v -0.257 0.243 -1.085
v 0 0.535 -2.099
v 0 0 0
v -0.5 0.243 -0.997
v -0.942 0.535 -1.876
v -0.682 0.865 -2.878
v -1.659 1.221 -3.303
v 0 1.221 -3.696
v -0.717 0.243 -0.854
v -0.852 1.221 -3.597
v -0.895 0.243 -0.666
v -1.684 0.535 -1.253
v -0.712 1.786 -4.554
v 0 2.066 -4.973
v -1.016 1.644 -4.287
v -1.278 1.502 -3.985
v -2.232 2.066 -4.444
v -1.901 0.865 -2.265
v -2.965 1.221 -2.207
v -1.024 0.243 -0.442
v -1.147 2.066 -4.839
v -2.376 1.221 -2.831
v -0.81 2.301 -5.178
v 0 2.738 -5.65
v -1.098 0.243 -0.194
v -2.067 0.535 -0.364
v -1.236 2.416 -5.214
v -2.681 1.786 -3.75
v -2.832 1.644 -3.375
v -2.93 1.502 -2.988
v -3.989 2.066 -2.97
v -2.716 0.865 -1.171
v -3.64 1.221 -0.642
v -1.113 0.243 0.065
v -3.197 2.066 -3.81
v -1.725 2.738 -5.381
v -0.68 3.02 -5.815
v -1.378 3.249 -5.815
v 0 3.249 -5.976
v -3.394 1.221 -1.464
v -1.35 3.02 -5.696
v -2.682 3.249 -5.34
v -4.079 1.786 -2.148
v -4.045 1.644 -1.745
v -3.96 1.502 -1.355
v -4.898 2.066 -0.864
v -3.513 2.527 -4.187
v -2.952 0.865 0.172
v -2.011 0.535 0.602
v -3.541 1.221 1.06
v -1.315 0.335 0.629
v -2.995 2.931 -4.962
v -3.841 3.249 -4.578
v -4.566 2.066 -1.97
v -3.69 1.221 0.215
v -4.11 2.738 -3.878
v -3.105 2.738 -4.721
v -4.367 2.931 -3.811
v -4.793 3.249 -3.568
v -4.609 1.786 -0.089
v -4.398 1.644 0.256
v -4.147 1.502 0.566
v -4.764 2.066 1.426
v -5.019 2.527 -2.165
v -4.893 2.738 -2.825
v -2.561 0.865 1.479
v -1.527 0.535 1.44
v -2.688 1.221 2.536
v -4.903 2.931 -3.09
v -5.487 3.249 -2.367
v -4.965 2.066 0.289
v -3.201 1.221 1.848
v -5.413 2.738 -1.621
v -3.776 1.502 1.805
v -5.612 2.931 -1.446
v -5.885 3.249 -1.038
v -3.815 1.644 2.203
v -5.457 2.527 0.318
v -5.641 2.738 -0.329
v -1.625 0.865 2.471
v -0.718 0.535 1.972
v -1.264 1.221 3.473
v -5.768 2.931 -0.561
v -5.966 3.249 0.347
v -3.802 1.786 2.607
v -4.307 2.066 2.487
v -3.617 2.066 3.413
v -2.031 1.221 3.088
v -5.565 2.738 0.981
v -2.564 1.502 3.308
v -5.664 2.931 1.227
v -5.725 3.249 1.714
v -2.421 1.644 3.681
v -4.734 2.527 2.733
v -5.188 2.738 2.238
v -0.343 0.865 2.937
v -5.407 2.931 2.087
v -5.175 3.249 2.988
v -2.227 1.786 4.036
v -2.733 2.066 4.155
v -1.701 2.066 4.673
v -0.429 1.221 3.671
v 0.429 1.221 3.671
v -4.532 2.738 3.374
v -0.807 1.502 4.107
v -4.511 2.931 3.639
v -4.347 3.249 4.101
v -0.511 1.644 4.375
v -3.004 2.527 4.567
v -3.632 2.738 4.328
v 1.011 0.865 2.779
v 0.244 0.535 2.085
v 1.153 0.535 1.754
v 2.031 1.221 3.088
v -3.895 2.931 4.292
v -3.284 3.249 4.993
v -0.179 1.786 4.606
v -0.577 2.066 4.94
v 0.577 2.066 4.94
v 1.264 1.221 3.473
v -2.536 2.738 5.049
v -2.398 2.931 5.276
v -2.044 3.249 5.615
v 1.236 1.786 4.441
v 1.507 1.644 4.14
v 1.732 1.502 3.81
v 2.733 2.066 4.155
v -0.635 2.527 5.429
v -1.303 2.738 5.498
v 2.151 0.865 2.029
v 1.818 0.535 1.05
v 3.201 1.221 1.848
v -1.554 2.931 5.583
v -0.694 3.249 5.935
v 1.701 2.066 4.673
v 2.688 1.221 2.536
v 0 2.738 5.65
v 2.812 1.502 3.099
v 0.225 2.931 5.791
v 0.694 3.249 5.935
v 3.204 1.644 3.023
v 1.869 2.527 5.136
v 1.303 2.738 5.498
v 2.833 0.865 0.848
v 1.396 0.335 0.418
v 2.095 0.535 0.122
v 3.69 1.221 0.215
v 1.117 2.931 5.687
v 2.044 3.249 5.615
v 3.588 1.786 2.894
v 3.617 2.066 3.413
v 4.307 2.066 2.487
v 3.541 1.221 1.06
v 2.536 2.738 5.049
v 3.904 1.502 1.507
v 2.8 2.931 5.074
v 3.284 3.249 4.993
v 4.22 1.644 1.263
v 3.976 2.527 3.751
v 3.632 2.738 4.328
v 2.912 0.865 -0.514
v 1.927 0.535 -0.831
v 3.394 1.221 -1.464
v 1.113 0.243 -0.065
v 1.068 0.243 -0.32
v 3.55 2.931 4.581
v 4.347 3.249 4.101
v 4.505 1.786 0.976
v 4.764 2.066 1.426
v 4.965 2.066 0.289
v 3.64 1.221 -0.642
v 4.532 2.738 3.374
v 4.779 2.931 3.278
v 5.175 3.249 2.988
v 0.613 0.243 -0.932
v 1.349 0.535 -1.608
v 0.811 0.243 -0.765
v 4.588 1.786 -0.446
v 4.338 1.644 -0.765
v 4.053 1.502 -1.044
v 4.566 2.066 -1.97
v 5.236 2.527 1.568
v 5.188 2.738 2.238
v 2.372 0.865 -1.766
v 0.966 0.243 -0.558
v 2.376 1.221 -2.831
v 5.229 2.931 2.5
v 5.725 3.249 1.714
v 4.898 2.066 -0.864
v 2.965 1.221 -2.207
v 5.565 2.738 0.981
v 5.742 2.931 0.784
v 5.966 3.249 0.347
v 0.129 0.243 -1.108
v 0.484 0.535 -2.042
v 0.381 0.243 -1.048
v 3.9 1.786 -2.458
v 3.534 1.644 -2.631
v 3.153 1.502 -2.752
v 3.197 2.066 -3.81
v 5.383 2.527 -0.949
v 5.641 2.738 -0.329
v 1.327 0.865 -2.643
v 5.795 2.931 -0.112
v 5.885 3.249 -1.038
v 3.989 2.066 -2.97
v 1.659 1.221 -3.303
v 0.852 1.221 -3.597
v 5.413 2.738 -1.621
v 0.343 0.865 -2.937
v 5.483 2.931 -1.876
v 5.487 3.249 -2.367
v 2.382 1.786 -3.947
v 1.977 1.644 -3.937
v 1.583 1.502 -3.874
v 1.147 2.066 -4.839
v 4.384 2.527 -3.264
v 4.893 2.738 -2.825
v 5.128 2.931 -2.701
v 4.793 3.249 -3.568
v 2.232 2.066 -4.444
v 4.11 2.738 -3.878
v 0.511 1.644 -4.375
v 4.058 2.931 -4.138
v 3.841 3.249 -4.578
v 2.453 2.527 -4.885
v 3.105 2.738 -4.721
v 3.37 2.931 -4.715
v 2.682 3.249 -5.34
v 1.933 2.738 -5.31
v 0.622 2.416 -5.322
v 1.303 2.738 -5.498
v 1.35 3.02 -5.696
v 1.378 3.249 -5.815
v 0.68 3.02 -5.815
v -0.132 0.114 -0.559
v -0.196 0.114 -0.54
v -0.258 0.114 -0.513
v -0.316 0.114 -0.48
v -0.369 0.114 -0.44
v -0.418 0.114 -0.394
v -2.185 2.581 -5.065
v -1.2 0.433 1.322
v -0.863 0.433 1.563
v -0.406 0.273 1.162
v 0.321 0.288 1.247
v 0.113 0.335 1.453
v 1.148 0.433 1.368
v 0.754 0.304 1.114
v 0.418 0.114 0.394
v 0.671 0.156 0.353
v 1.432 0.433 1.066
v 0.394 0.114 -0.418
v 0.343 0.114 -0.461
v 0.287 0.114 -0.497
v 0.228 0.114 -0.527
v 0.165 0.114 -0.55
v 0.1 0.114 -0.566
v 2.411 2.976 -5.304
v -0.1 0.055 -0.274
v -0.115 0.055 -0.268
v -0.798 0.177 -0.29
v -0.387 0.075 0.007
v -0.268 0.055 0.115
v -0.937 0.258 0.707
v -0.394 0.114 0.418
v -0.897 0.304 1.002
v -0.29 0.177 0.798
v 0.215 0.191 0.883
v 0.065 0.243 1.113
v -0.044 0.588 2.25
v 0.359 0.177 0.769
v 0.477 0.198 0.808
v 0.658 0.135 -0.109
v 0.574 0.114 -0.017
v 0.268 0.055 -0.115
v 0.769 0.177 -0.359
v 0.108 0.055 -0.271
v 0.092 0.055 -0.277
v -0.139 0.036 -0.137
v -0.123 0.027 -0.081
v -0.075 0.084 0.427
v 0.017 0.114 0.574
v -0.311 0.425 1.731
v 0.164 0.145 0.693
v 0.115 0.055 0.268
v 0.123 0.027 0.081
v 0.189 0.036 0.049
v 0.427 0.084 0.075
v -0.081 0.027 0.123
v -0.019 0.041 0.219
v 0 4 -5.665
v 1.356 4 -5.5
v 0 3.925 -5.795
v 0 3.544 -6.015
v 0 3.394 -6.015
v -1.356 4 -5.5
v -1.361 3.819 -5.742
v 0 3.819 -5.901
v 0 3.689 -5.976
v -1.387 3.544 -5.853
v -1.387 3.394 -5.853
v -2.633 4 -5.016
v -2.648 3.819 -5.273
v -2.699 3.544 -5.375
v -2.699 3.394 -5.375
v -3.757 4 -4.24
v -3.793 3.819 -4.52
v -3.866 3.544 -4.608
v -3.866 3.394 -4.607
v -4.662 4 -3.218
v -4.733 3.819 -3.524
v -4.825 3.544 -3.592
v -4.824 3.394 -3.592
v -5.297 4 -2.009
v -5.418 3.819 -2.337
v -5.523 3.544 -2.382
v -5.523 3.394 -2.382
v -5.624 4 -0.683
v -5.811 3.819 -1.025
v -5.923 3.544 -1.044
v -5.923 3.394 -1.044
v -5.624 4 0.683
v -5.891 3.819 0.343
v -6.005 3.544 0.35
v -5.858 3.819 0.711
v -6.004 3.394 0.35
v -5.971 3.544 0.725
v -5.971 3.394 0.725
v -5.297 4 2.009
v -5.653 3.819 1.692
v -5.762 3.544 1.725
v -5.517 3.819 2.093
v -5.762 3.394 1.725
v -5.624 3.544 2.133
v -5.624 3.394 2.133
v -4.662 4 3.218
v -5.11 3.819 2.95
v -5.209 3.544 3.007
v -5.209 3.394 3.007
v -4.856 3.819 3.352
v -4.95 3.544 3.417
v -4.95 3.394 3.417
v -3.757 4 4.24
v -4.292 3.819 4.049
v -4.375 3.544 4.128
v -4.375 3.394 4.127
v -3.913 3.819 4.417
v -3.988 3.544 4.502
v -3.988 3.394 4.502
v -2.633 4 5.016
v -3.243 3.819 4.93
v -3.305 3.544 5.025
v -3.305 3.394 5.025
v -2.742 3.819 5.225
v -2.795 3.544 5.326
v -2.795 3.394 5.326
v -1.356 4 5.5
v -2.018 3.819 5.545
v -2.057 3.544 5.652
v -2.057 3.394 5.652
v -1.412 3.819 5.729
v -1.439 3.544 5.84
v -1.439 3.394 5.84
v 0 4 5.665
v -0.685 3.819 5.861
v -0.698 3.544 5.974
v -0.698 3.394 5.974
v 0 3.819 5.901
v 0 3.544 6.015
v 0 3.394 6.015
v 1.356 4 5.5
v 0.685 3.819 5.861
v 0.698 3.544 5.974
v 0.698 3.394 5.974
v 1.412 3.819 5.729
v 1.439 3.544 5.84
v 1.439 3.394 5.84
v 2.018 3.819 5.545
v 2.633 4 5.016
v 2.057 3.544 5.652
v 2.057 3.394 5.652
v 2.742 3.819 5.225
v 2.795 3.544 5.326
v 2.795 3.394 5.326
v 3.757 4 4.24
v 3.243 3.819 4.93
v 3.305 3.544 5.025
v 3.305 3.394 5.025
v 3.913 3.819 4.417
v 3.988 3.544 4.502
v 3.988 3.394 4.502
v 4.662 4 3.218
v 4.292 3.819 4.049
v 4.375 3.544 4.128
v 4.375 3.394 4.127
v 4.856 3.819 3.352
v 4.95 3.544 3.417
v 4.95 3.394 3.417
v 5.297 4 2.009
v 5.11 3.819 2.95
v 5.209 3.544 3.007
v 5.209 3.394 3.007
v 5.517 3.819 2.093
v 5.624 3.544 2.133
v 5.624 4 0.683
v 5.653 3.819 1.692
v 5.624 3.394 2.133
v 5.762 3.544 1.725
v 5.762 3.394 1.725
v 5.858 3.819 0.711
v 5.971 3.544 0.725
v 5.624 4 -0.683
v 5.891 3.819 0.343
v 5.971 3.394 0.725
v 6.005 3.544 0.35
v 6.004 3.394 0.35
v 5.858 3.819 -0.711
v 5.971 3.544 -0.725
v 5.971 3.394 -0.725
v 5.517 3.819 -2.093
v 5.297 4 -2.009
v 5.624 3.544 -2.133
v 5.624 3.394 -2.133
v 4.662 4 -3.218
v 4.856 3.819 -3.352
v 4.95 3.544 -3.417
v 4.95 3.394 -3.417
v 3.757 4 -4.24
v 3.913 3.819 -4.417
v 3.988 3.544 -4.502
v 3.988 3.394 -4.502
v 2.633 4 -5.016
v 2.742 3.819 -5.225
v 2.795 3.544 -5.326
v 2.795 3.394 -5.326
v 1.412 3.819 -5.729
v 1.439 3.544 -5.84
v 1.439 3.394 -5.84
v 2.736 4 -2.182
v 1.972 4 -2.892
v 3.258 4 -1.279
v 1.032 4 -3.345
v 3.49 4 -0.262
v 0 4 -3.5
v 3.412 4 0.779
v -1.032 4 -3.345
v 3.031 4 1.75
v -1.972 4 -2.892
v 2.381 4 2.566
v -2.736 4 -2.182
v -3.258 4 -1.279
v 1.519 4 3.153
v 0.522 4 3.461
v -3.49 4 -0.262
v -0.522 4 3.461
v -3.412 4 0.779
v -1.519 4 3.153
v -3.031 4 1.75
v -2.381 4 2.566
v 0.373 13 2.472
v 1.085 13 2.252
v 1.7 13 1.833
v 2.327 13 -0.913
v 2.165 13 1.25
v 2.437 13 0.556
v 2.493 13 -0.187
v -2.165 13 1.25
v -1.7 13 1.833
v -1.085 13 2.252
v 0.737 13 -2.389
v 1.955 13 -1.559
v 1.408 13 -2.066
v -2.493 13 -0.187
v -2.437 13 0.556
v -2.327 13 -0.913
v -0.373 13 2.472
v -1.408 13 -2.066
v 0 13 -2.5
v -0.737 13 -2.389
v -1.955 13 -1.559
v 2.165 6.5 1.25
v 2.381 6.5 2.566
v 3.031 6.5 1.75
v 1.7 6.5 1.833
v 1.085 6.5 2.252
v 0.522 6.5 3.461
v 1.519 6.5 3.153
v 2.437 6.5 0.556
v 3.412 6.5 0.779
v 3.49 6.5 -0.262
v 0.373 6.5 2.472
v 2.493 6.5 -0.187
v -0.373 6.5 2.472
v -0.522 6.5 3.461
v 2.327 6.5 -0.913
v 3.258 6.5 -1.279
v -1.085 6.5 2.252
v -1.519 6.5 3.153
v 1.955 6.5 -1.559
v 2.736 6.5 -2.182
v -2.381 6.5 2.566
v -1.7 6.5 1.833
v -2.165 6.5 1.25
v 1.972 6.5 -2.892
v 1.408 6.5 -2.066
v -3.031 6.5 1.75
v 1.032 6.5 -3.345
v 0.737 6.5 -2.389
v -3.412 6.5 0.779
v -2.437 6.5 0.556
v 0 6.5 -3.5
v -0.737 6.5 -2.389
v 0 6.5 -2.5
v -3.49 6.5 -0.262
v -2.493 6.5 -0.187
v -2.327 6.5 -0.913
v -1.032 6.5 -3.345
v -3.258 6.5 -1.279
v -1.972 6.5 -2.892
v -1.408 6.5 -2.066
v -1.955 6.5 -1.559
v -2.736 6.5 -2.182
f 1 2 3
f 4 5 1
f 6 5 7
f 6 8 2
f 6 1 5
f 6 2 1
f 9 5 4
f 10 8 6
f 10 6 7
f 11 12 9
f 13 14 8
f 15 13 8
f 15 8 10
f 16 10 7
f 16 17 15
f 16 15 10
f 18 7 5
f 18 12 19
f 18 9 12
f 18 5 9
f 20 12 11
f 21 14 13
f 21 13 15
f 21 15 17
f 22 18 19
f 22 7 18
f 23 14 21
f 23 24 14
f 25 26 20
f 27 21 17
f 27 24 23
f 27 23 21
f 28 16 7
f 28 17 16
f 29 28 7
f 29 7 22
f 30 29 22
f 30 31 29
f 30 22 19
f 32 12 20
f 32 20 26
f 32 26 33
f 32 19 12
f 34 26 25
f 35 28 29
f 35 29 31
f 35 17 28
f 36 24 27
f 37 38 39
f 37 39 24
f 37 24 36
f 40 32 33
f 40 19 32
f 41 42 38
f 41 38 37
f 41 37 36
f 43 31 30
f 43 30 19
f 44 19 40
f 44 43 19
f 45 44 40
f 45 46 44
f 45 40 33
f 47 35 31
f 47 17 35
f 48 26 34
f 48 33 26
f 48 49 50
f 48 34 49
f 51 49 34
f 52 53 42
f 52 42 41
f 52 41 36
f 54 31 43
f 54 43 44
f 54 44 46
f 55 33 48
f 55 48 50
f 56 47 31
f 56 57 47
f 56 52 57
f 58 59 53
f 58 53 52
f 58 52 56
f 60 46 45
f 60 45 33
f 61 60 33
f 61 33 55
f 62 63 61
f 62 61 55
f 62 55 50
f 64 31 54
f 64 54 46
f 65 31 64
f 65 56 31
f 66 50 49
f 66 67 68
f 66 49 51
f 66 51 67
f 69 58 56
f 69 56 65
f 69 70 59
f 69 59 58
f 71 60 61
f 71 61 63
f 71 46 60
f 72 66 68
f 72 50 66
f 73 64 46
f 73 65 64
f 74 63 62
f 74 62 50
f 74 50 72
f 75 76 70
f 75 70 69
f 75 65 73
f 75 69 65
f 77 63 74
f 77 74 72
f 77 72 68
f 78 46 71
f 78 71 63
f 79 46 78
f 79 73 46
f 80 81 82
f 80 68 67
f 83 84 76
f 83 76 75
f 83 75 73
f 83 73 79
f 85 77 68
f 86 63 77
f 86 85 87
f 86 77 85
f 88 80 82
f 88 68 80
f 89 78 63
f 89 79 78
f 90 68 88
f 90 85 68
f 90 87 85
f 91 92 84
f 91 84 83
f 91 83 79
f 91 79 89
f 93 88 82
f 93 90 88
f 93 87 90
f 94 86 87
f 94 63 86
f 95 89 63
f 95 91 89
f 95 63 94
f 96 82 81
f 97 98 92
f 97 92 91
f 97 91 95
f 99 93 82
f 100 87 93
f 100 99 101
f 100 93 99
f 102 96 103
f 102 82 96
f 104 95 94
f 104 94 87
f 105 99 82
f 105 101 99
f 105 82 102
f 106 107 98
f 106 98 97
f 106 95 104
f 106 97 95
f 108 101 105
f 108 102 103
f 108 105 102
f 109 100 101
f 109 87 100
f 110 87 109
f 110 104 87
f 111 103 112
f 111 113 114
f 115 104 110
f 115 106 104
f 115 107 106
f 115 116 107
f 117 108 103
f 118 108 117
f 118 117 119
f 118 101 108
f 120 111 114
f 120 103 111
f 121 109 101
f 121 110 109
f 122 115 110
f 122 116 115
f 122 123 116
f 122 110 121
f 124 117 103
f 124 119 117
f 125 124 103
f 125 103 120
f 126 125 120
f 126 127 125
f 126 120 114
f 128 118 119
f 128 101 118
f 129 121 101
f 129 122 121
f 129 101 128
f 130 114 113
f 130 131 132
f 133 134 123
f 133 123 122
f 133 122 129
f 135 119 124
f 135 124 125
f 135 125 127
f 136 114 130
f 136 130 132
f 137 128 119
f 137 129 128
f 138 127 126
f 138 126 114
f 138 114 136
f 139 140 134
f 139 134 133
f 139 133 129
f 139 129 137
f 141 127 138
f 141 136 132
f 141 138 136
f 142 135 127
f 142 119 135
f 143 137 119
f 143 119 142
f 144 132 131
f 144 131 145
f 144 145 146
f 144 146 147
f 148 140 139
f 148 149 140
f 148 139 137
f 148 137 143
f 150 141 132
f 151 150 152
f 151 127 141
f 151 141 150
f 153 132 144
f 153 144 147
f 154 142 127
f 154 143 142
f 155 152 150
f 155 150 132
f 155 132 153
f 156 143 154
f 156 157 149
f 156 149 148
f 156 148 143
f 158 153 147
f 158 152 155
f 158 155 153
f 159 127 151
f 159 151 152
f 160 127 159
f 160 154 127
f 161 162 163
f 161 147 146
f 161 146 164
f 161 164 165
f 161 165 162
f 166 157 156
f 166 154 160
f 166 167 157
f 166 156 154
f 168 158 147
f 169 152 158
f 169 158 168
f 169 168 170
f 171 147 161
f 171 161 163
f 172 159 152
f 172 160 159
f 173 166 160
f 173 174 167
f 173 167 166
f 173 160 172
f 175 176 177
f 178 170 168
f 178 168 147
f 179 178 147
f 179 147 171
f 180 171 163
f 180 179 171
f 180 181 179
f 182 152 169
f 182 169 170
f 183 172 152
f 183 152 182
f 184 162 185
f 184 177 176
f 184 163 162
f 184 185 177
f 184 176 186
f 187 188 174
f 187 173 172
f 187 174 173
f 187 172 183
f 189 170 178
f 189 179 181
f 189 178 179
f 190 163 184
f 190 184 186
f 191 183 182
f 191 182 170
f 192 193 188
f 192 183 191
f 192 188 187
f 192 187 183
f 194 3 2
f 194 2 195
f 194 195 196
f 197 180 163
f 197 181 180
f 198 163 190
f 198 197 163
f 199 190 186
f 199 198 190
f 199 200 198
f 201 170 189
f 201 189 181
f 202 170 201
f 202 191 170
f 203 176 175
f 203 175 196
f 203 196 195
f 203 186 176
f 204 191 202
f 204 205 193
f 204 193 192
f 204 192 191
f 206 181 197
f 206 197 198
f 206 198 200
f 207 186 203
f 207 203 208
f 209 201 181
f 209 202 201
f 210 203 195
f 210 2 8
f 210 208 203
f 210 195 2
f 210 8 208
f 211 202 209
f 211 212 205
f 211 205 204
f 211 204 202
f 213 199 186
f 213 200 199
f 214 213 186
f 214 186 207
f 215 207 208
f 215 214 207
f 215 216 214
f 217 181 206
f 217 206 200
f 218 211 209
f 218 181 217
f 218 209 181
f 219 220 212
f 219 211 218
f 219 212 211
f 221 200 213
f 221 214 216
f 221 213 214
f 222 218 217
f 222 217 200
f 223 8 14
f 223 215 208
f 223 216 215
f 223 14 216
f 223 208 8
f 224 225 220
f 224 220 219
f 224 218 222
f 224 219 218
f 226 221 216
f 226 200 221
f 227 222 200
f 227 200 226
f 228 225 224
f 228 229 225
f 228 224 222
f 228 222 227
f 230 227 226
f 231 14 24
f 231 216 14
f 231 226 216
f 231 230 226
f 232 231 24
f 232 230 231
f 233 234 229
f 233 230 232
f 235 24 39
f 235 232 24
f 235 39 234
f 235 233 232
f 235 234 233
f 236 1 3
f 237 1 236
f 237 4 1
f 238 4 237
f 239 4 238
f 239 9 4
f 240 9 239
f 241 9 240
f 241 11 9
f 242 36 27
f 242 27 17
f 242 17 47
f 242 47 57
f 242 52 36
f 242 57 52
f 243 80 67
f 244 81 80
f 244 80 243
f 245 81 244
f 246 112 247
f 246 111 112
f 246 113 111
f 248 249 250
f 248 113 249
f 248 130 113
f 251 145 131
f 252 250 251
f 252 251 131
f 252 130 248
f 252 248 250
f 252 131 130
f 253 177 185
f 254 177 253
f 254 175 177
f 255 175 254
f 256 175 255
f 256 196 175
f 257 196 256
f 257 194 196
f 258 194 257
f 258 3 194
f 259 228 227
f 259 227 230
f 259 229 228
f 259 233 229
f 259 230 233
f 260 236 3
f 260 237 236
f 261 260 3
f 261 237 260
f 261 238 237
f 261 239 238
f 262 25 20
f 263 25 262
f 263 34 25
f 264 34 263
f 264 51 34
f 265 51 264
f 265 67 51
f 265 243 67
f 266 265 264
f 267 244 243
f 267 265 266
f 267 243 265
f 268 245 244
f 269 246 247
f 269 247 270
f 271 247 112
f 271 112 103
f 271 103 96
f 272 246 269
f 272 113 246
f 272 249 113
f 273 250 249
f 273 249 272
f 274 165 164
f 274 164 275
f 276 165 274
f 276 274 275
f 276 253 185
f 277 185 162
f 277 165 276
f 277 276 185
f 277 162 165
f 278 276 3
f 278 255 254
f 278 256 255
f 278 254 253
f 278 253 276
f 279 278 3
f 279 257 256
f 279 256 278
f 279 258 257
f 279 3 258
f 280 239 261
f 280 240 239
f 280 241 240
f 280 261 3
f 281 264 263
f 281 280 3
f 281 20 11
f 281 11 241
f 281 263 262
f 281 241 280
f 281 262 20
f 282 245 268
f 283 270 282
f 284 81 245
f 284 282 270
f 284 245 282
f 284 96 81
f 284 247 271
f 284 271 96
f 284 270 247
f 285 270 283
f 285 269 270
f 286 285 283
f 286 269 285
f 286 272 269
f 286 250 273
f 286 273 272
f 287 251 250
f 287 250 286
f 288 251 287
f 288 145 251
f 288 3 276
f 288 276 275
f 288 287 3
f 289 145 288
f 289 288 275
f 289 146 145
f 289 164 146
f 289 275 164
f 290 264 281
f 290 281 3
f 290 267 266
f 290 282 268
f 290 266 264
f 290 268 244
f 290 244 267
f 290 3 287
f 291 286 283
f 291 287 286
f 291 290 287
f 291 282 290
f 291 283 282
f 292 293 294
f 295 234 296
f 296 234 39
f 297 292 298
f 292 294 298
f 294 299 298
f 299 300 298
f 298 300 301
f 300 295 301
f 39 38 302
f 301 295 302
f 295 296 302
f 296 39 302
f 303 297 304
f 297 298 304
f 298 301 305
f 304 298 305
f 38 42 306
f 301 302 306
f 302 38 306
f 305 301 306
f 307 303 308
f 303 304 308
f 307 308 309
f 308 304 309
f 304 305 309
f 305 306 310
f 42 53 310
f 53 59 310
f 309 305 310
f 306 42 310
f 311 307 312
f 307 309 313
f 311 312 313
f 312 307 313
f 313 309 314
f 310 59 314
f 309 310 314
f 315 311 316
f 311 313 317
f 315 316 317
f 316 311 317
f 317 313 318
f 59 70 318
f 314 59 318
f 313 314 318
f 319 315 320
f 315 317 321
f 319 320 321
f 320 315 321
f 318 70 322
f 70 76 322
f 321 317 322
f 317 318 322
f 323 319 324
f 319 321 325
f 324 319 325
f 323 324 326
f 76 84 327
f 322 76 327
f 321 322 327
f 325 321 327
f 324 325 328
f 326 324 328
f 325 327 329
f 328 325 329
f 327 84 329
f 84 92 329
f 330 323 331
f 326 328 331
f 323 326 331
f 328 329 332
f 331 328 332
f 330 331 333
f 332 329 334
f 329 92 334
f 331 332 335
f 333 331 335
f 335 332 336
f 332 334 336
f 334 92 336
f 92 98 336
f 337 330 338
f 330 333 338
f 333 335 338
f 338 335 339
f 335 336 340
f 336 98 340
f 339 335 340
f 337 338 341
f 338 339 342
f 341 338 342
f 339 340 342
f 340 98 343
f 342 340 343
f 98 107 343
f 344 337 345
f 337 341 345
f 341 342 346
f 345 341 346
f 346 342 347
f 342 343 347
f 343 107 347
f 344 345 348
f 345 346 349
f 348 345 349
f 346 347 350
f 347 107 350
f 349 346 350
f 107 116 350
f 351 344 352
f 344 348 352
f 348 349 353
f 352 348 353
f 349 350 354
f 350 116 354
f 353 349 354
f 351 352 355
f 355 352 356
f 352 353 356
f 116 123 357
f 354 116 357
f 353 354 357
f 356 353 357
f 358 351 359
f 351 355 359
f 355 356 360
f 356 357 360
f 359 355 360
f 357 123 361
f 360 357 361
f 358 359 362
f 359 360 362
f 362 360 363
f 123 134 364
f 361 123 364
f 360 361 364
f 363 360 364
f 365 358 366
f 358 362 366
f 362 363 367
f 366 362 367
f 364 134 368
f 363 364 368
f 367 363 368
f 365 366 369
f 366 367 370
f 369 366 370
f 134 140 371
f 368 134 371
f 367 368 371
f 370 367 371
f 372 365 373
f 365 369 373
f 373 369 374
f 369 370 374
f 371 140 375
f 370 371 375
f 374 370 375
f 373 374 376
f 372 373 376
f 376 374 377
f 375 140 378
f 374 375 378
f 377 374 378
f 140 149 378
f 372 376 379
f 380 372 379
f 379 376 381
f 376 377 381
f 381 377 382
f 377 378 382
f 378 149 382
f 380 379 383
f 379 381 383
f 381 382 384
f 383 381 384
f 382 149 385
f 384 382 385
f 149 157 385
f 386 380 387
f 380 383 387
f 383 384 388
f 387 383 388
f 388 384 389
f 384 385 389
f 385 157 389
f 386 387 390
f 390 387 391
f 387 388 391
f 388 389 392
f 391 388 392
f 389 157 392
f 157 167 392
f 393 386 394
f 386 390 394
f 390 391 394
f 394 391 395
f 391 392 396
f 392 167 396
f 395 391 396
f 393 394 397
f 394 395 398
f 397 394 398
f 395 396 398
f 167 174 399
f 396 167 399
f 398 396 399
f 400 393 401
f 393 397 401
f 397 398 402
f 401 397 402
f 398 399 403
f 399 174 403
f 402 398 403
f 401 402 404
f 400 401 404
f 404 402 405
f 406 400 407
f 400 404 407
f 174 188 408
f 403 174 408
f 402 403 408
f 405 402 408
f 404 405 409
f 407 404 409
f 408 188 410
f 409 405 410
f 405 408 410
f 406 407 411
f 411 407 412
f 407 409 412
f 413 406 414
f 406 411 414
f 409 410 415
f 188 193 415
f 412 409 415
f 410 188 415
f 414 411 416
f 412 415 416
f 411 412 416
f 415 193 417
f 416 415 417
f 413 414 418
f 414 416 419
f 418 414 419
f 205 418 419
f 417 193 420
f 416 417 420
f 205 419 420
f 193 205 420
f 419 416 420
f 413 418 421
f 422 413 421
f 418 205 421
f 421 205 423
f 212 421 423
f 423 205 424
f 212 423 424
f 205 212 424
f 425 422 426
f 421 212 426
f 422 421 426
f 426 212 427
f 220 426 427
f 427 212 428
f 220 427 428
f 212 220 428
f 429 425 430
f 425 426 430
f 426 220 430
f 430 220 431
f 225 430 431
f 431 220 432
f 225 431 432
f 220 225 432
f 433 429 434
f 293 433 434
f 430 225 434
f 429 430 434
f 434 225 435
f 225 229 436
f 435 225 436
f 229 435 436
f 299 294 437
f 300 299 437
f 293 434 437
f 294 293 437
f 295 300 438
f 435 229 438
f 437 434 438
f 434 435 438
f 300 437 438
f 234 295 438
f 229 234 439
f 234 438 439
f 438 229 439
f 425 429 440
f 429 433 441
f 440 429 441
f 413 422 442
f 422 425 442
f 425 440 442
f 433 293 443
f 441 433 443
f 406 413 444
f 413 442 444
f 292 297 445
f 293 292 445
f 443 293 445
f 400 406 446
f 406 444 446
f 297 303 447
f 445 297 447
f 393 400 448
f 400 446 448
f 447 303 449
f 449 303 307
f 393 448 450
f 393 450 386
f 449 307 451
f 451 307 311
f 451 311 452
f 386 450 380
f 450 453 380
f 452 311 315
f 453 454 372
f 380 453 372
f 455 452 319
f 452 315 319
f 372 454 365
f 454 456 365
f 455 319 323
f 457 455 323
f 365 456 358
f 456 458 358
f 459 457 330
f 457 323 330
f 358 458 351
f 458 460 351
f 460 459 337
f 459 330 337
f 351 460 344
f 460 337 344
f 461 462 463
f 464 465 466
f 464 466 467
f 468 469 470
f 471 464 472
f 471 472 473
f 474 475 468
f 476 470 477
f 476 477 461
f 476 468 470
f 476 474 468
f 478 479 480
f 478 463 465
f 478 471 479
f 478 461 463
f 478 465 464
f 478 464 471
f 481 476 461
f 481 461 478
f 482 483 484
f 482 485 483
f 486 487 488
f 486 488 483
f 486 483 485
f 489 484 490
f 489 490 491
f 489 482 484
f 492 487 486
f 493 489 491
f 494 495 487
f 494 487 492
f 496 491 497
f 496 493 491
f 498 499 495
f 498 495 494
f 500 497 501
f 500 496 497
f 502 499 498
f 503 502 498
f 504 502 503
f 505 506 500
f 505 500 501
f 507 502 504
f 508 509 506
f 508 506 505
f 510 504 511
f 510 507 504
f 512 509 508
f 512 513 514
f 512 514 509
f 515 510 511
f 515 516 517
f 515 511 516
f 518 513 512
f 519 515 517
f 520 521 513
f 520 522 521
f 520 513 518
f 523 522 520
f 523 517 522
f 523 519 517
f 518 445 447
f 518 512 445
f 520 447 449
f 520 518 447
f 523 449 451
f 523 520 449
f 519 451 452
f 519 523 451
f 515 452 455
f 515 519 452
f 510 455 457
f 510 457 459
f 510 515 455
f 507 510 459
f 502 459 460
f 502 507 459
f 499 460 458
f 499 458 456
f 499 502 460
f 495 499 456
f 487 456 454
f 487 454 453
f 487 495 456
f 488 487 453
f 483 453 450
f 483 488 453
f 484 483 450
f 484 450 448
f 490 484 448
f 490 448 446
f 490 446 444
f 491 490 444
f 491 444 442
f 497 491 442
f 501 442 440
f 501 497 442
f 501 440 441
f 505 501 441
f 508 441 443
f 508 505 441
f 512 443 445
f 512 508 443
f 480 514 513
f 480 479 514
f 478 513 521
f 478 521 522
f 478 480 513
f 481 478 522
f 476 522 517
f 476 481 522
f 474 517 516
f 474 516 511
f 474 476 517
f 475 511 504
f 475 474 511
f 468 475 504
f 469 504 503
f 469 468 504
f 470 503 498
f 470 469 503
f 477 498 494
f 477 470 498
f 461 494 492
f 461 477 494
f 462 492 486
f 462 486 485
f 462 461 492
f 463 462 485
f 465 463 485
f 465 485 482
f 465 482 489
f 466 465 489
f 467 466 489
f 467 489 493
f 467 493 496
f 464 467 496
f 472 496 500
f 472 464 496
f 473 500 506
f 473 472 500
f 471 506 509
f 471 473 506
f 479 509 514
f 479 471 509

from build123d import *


with BuildPart() as part:
    # Sketch1 → Revolve1 (revolve)
    with BuildSketch(Plane.XY, mode=Mode.PRIVATE) as revolve1_sk:
        with BuildLine():
            Line((0, 0), (0, 4))
            Line((0, 4), (5.665073225, 4))
            ThreePointArc((5.665073225, 4), (5.975896248, 3.689038292), (5.975798184, 3.249370092))
            add(Edge.make_bspline(
                [(0, 0), (4.05719651, 0.732493998), (5.691820154, 2.564218754), (5.975798184, 3.249370092)],
                knots=[0, 0, 0, 0, 1, 1, 1, 1], degree=3))
        make_face()
        Polygon((0, 13), (0, 4), (3.5, 4), (3.5, 6.5), (2.5, 6.5), (2.5, 13), align=None)
    revolve(revolve1_sk.sketch.rotate(Axis((0, 0, 0), (0, 1, 0)), 90), axis=Axis((0, 0, 0), (0, 1, 0)))


solid = part.part
